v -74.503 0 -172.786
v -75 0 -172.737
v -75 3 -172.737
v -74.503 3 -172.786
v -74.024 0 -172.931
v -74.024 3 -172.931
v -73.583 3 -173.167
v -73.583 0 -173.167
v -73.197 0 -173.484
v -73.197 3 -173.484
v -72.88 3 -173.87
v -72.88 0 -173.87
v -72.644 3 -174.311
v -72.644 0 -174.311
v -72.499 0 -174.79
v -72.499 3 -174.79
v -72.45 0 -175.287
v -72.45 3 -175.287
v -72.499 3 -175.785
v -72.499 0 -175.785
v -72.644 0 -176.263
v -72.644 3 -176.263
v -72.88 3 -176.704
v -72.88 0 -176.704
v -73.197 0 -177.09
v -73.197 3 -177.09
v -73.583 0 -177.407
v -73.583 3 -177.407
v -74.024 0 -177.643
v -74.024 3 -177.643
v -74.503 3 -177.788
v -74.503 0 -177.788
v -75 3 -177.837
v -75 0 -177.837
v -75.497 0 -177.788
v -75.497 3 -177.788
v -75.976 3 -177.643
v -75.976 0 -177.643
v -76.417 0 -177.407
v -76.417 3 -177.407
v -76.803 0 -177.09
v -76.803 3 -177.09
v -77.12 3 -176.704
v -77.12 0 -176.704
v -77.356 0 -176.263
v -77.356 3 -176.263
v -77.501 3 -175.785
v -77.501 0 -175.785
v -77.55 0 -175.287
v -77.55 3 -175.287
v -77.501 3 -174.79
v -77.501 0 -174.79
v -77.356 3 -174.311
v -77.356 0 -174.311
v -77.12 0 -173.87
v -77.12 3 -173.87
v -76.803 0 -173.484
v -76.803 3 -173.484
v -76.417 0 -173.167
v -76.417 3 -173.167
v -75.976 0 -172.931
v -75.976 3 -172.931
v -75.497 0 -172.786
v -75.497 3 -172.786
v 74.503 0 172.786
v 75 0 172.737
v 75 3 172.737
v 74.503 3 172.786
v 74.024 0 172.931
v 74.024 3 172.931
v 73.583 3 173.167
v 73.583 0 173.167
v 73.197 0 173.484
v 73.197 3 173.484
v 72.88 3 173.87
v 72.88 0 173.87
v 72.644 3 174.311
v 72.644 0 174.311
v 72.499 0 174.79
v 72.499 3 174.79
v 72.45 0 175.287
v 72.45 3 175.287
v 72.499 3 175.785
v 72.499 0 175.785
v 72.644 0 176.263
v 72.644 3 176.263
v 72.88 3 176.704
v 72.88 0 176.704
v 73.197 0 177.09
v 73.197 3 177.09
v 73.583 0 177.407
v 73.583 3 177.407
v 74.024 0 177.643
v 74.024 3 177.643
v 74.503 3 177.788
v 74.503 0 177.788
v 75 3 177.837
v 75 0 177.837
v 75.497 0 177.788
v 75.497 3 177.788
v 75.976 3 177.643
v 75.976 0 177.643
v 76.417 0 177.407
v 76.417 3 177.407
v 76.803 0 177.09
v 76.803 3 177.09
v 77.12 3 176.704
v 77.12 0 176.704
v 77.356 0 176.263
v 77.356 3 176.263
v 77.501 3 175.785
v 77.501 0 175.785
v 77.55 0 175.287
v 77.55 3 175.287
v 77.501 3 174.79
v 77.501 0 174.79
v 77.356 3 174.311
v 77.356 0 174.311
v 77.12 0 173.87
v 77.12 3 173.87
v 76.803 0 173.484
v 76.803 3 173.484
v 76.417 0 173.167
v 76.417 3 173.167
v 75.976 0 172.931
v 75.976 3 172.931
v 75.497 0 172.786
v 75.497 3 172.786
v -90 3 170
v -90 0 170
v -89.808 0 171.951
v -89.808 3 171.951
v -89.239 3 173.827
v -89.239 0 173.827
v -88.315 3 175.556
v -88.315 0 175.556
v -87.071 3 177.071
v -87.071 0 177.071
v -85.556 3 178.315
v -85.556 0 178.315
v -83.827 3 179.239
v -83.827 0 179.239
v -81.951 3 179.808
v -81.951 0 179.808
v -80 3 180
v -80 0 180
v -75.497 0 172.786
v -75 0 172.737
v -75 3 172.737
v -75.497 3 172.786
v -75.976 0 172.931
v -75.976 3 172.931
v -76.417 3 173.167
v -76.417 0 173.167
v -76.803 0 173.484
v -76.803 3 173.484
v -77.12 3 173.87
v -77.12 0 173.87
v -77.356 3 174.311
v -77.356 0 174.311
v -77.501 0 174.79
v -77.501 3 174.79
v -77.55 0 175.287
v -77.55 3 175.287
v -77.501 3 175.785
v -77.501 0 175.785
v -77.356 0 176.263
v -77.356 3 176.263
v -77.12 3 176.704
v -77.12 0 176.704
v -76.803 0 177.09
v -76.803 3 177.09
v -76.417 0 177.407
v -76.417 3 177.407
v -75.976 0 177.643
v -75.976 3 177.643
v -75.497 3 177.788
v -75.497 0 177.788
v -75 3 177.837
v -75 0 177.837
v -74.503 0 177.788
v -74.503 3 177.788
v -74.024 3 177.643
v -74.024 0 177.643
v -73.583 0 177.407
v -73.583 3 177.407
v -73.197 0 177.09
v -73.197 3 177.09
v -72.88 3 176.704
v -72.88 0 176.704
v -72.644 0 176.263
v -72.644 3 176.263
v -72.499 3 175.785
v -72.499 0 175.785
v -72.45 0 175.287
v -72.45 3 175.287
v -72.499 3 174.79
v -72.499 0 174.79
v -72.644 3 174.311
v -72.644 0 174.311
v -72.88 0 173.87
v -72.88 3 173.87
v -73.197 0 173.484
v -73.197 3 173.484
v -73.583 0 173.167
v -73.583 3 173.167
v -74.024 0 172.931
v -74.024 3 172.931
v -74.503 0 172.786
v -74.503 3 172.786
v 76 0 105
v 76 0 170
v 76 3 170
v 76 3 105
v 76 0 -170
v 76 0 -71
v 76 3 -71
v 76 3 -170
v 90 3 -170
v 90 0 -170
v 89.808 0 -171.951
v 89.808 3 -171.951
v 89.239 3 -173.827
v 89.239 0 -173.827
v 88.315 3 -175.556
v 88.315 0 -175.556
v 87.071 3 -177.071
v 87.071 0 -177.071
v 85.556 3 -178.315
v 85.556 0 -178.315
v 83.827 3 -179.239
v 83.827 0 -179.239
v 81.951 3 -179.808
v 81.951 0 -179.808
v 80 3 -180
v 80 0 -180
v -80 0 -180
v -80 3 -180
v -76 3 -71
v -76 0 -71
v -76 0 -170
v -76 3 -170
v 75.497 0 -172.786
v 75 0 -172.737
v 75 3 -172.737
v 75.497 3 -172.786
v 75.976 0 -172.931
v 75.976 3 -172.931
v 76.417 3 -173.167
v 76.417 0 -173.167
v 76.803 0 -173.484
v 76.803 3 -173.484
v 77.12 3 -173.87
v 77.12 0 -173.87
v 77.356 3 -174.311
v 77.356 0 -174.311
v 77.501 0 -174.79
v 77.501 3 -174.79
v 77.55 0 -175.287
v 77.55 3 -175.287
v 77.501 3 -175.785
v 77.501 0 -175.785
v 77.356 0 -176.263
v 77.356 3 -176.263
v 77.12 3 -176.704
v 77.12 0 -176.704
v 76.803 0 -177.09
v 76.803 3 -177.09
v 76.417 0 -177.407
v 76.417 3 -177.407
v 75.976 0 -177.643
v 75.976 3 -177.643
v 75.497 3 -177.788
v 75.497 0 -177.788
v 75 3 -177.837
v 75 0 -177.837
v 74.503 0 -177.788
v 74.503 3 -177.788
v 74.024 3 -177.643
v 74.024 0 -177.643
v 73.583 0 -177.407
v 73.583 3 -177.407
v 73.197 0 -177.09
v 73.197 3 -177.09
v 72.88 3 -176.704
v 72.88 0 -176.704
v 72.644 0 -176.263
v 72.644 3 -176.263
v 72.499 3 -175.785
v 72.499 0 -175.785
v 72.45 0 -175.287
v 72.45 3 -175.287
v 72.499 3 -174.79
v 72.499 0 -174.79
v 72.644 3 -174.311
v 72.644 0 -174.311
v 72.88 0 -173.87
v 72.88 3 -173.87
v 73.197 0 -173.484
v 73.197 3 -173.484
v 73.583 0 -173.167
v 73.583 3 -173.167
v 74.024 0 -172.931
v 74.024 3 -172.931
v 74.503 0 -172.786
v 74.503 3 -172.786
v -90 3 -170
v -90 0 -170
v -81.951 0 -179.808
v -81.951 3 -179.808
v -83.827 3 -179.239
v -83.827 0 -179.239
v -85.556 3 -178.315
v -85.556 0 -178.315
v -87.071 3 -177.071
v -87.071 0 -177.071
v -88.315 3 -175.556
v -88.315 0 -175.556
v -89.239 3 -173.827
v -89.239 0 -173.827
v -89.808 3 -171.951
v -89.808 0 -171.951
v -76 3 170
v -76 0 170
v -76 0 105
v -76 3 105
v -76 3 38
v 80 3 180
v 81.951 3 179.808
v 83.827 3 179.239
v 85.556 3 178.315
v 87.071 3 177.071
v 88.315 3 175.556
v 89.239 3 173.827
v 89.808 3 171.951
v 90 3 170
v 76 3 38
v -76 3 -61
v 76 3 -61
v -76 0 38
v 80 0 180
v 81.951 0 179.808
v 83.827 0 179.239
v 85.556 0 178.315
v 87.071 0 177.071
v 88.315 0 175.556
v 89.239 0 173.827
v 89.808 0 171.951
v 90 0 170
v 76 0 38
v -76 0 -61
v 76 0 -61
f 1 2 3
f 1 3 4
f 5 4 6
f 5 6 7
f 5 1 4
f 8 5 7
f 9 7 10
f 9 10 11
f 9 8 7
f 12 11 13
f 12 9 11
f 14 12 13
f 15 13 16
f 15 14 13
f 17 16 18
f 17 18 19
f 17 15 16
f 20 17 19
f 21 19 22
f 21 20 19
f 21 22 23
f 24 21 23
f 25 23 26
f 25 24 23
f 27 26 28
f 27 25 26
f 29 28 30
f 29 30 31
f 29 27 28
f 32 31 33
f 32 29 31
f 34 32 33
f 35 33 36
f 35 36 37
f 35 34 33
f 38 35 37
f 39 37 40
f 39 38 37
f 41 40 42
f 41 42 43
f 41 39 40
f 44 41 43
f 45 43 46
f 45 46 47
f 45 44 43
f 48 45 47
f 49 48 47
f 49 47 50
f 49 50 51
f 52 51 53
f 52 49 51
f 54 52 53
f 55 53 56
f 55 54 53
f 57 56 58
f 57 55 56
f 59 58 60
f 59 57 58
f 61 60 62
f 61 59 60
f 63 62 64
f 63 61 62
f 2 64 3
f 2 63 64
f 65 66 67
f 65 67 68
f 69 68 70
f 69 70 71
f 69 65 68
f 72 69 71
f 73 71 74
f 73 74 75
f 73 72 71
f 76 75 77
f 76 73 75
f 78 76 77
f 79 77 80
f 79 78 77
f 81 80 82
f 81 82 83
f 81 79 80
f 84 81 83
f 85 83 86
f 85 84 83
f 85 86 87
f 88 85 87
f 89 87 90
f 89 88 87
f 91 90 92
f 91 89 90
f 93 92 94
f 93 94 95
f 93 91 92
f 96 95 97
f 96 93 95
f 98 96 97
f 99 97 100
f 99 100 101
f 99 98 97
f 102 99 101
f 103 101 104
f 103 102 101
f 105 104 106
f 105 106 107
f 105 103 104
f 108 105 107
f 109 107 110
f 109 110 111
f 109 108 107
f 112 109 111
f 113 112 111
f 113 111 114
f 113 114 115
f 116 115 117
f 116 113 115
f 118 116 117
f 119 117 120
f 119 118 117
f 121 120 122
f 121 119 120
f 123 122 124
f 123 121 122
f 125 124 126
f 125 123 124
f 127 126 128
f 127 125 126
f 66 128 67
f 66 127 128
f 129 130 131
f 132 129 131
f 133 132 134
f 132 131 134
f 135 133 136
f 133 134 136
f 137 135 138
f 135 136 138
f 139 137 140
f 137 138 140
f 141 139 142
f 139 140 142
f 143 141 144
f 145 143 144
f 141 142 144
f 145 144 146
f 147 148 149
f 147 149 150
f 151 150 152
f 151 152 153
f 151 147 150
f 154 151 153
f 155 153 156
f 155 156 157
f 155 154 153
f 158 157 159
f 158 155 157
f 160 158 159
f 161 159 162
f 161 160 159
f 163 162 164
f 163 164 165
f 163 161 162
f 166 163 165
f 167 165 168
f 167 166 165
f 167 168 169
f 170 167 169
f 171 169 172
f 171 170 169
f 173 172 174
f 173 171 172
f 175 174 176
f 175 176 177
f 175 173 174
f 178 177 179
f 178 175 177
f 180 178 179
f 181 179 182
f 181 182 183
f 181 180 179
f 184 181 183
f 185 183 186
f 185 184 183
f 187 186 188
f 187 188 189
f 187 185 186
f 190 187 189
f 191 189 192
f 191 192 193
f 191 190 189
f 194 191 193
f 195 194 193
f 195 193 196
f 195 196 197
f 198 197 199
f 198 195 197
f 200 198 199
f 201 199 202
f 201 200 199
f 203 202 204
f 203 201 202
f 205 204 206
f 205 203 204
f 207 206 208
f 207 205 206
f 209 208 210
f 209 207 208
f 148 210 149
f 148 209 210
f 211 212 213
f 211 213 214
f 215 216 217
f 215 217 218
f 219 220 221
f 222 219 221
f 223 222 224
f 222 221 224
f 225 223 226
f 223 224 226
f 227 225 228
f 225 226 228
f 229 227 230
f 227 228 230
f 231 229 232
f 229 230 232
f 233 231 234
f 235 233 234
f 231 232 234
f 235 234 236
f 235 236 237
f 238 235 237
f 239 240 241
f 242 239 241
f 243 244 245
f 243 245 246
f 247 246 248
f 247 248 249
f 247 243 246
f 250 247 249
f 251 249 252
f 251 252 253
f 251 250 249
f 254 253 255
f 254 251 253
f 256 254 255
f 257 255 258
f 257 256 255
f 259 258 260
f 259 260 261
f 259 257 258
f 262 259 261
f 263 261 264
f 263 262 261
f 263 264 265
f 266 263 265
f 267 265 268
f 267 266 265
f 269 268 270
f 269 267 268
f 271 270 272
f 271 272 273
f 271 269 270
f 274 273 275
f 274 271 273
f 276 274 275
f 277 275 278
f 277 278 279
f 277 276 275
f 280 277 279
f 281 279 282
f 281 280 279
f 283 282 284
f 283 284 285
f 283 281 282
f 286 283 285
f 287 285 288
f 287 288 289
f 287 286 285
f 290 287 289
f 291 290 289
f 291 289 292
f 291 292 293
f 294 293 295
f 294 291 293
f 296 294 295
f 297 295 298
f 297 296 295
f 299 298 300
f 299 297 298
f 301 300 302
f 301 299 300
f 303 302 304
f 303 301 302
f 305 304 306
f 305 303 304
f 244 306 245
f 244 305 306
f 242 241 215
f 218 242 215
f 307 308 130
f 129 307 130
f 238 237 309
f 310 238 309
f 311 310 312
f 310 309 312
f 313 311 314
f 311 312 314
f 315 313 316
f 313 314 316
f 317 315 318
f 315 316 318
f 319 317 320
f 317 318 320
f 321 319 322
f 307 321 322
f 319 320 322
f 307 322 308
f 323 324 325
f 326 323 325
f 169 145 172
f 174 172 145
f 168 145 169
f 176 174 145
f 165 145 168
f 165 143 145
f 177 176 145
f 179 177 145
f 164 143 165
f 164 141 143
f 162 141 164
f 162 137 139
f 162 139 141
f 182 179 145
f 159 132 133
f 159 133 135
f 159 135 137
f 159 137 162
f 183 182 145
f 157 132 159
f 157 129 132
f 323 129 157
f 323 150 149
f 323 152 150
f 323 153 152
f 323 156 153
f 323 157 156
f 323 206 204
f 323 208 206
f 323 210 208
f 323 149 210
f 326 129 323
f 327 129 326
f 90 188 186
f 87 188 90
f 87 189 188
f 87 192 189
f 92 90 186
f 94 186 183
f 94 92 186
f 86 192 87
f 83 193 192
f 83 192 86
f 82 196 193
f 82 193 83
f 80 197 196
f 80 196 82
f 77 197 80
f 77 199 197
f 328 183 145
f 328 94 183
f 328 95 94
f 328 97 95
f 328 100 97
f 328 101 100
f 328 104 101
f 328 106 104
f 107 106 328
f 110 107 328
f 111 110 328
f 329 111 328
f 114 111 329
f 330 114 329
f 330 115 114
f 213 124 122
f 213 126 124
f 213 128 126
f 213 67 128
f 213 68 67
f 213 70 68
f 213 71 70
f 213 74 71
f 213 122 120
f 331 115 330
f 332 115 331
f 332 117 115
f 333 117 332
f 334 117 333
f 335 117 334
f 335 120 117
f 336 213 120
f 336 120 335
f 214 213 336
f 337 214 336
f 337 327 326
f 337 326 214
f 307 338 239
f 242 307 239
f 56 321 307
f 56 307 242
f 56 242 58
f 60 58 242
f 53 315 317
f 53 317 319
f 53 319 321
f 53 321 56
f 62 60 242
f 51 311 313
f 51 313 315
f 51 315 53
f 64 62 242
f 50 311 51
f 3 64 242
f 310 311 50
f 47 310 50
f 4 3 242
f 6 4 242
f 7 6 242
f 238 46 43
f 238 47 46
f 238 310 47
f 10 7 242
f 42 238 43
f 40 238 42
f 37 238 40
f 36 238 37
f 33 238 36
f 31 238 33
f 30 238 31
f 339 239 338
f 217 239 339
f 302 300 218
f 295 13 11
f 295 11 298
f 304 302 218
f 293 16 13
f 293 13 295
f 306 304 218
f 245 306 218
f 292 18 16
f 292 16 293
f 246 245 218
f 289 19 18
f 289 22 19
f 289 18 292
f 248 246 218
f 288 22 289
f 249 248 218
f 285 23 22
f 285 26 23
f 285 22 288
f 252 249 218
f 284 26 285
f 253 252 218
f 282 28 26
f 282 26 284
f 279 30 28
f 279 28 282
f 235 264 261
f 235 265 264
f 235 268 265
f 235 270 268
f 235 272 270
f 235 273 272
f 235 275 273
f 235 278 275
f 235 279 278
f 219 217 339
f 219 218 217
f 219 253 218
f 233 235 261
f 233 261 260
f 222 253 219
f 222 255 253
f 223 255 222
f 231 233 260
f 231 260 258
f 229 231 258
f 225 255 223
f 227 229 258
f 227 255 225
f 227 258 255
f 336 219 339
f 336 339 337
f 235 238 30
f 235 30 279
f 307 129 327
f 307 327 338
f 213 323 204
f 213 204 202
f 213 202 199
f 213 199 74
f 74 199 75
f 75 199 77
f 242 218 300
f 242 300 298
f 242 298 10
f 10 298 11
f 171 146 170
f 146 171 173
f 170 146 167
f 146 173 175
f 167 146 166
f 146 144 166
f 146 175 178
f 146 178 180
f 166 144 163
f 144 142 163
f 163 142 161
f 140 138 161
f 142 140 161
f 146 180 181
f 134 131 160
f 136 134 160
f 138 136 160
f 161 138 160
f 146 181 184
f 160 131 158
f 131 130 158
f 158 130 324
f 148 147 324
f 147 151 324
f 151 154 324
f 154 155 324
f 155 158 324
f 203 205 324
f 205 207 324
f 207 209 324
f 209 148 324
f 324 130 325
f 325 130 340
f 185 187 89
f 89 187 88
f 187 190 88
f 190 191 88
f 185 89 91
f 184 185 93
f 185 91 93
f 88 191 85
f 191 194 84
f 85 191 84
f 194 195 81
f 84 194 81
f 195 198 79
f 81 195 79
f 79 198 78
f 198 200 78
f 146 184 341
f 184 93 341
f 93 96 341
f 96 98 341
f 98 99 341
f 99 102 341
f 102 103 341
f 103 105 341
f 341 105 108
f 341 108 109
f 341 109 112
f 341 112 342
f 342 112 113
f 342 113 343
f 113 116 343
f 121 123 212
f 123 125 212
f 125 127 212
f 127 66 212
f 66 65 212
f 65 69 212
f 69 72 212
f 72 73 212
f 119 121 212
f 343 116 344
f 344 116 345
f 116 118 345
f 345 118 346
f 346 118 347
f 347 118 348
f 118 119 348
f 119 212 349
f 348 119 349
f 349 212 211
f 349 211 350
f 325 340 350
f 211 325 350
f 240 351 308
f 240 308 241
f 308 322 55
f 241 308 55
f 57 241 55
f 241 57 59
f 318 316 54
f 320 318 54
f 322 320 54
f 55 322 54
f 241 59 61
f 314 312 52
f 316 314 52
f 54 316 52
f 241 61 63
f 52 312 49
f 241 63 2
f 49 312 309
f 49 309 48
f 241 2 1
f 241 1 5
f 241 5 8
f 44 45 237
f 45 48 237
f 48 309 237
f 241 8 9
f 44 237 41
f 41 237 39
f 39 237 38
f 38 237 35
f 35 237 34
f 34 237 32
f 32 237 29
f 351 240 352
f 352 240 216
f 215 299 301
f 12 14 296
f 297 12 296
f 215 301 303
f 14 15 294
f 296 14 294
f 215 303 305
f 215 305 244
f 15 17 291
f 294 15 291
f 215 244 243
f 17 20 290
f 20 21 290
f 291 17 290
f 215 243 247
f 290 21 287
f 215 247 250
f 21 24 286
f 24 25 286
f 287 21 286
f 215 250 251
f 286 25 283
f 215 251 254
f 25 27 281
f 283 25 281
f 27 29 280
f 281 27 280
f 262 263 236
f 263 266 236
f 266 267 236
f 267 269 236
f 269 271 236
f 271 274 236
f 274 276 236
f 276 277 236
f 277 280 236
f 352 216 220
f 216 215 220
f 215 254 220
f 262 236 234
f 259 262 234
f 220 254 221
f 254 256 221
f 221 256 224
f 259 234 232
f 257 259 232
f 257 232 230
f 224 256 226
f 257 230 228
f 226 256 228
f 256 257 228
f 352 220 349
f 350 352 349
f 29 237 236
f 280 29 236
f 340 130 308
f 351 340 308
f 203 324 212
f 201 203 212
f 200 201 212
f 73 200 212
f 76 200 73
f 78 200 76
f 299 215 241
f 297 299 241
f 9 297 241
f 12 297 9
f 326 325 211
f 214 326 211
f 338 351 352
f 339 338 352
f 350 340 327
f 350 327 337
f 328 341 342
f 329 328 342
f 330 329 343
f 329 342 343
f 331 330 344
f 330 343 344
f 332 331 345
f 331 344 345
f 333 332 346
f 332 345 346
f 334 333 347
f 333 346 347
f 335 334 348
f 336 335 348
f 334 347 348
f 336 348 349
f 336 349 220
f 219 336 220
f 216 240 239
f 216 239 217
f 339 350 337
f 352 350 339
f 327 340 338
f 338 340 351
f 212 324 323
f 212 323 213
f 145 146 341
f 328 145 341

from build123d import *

# Parameters (mm, degrees)
SKETCH1_R           = 2.55
SKETCH1_W           = 152
SKETCH1_H           = 99
SKETCH1_H_2         = 65
BOSS_EXTRUDE1_DEPTH = 3


with BuildPart() as part:
    # Sketch1 → Boss-Extrude1 (new body)
    with BuildSketch(Plane(origin=(0, 0, 0), x_dir=(1, 0, 0), z_dir=(0, 1, 0))):
        with BuildLine():
            Line((-80, -180), (80, -180))
            ThreePointArc((80, -180), (87.071067812, -177.071067812), (90, -170))
            Line((90, -170), (90, 170))
            ThreePointArc((90, 170), (87.071067812, 177.071067812), (80, 180))
            Line((80, 180), (-80, 180))
            ThreePointArc((-80, 180), (-87.071067812, 177.071067812), (-90, 170))
            Line((-90, 170), (-90, -170))
            ThreePointArc((-90, -170), (-87.071067812, -177.071067812), (-80, -180))
        make_face()
        with Locations(Location((-75, 175.287107213, 0), (0, 0, 270))):
            Circle(SKETCH1_R, mode=Mode.SUBTRACT)
        with Locations(Location((75, 175.287107213, 0), (0, 0, 270))):
            Circle(SKETCH1_R, mode=Mode.SUBTRACT)
        with Locations(Location((-75, -175.287107213, 0), (0, 0, 90))):
            Circle(SKETCH1_R, mode=Mode.SUBTRACT)
        with Locations(Location((75, -175.287107213, 0), (0, 0, 90))):
            Circle(SKETCH1_R, mode=Mode.SUBTRACT)
        with Locations((0, 120.5)):
            Rectangle(SKETCH1_W, SKETCH1_H, mode=Mode.SUBTRACT)
        with Locations((0, -137.5)):
            Rectangle(SKETCH1_W, SKETCH1_H_2, mode=Mode.SUBTRACT)
        with Locations((0, 11.5)):
            Rectangle(SKETCH1_W, SKETCH1_H, mode=Mode.SUBTRACT)
    extrude(amount=BOSS_EXTRUDE1_DEPTH)


solid = part.part
